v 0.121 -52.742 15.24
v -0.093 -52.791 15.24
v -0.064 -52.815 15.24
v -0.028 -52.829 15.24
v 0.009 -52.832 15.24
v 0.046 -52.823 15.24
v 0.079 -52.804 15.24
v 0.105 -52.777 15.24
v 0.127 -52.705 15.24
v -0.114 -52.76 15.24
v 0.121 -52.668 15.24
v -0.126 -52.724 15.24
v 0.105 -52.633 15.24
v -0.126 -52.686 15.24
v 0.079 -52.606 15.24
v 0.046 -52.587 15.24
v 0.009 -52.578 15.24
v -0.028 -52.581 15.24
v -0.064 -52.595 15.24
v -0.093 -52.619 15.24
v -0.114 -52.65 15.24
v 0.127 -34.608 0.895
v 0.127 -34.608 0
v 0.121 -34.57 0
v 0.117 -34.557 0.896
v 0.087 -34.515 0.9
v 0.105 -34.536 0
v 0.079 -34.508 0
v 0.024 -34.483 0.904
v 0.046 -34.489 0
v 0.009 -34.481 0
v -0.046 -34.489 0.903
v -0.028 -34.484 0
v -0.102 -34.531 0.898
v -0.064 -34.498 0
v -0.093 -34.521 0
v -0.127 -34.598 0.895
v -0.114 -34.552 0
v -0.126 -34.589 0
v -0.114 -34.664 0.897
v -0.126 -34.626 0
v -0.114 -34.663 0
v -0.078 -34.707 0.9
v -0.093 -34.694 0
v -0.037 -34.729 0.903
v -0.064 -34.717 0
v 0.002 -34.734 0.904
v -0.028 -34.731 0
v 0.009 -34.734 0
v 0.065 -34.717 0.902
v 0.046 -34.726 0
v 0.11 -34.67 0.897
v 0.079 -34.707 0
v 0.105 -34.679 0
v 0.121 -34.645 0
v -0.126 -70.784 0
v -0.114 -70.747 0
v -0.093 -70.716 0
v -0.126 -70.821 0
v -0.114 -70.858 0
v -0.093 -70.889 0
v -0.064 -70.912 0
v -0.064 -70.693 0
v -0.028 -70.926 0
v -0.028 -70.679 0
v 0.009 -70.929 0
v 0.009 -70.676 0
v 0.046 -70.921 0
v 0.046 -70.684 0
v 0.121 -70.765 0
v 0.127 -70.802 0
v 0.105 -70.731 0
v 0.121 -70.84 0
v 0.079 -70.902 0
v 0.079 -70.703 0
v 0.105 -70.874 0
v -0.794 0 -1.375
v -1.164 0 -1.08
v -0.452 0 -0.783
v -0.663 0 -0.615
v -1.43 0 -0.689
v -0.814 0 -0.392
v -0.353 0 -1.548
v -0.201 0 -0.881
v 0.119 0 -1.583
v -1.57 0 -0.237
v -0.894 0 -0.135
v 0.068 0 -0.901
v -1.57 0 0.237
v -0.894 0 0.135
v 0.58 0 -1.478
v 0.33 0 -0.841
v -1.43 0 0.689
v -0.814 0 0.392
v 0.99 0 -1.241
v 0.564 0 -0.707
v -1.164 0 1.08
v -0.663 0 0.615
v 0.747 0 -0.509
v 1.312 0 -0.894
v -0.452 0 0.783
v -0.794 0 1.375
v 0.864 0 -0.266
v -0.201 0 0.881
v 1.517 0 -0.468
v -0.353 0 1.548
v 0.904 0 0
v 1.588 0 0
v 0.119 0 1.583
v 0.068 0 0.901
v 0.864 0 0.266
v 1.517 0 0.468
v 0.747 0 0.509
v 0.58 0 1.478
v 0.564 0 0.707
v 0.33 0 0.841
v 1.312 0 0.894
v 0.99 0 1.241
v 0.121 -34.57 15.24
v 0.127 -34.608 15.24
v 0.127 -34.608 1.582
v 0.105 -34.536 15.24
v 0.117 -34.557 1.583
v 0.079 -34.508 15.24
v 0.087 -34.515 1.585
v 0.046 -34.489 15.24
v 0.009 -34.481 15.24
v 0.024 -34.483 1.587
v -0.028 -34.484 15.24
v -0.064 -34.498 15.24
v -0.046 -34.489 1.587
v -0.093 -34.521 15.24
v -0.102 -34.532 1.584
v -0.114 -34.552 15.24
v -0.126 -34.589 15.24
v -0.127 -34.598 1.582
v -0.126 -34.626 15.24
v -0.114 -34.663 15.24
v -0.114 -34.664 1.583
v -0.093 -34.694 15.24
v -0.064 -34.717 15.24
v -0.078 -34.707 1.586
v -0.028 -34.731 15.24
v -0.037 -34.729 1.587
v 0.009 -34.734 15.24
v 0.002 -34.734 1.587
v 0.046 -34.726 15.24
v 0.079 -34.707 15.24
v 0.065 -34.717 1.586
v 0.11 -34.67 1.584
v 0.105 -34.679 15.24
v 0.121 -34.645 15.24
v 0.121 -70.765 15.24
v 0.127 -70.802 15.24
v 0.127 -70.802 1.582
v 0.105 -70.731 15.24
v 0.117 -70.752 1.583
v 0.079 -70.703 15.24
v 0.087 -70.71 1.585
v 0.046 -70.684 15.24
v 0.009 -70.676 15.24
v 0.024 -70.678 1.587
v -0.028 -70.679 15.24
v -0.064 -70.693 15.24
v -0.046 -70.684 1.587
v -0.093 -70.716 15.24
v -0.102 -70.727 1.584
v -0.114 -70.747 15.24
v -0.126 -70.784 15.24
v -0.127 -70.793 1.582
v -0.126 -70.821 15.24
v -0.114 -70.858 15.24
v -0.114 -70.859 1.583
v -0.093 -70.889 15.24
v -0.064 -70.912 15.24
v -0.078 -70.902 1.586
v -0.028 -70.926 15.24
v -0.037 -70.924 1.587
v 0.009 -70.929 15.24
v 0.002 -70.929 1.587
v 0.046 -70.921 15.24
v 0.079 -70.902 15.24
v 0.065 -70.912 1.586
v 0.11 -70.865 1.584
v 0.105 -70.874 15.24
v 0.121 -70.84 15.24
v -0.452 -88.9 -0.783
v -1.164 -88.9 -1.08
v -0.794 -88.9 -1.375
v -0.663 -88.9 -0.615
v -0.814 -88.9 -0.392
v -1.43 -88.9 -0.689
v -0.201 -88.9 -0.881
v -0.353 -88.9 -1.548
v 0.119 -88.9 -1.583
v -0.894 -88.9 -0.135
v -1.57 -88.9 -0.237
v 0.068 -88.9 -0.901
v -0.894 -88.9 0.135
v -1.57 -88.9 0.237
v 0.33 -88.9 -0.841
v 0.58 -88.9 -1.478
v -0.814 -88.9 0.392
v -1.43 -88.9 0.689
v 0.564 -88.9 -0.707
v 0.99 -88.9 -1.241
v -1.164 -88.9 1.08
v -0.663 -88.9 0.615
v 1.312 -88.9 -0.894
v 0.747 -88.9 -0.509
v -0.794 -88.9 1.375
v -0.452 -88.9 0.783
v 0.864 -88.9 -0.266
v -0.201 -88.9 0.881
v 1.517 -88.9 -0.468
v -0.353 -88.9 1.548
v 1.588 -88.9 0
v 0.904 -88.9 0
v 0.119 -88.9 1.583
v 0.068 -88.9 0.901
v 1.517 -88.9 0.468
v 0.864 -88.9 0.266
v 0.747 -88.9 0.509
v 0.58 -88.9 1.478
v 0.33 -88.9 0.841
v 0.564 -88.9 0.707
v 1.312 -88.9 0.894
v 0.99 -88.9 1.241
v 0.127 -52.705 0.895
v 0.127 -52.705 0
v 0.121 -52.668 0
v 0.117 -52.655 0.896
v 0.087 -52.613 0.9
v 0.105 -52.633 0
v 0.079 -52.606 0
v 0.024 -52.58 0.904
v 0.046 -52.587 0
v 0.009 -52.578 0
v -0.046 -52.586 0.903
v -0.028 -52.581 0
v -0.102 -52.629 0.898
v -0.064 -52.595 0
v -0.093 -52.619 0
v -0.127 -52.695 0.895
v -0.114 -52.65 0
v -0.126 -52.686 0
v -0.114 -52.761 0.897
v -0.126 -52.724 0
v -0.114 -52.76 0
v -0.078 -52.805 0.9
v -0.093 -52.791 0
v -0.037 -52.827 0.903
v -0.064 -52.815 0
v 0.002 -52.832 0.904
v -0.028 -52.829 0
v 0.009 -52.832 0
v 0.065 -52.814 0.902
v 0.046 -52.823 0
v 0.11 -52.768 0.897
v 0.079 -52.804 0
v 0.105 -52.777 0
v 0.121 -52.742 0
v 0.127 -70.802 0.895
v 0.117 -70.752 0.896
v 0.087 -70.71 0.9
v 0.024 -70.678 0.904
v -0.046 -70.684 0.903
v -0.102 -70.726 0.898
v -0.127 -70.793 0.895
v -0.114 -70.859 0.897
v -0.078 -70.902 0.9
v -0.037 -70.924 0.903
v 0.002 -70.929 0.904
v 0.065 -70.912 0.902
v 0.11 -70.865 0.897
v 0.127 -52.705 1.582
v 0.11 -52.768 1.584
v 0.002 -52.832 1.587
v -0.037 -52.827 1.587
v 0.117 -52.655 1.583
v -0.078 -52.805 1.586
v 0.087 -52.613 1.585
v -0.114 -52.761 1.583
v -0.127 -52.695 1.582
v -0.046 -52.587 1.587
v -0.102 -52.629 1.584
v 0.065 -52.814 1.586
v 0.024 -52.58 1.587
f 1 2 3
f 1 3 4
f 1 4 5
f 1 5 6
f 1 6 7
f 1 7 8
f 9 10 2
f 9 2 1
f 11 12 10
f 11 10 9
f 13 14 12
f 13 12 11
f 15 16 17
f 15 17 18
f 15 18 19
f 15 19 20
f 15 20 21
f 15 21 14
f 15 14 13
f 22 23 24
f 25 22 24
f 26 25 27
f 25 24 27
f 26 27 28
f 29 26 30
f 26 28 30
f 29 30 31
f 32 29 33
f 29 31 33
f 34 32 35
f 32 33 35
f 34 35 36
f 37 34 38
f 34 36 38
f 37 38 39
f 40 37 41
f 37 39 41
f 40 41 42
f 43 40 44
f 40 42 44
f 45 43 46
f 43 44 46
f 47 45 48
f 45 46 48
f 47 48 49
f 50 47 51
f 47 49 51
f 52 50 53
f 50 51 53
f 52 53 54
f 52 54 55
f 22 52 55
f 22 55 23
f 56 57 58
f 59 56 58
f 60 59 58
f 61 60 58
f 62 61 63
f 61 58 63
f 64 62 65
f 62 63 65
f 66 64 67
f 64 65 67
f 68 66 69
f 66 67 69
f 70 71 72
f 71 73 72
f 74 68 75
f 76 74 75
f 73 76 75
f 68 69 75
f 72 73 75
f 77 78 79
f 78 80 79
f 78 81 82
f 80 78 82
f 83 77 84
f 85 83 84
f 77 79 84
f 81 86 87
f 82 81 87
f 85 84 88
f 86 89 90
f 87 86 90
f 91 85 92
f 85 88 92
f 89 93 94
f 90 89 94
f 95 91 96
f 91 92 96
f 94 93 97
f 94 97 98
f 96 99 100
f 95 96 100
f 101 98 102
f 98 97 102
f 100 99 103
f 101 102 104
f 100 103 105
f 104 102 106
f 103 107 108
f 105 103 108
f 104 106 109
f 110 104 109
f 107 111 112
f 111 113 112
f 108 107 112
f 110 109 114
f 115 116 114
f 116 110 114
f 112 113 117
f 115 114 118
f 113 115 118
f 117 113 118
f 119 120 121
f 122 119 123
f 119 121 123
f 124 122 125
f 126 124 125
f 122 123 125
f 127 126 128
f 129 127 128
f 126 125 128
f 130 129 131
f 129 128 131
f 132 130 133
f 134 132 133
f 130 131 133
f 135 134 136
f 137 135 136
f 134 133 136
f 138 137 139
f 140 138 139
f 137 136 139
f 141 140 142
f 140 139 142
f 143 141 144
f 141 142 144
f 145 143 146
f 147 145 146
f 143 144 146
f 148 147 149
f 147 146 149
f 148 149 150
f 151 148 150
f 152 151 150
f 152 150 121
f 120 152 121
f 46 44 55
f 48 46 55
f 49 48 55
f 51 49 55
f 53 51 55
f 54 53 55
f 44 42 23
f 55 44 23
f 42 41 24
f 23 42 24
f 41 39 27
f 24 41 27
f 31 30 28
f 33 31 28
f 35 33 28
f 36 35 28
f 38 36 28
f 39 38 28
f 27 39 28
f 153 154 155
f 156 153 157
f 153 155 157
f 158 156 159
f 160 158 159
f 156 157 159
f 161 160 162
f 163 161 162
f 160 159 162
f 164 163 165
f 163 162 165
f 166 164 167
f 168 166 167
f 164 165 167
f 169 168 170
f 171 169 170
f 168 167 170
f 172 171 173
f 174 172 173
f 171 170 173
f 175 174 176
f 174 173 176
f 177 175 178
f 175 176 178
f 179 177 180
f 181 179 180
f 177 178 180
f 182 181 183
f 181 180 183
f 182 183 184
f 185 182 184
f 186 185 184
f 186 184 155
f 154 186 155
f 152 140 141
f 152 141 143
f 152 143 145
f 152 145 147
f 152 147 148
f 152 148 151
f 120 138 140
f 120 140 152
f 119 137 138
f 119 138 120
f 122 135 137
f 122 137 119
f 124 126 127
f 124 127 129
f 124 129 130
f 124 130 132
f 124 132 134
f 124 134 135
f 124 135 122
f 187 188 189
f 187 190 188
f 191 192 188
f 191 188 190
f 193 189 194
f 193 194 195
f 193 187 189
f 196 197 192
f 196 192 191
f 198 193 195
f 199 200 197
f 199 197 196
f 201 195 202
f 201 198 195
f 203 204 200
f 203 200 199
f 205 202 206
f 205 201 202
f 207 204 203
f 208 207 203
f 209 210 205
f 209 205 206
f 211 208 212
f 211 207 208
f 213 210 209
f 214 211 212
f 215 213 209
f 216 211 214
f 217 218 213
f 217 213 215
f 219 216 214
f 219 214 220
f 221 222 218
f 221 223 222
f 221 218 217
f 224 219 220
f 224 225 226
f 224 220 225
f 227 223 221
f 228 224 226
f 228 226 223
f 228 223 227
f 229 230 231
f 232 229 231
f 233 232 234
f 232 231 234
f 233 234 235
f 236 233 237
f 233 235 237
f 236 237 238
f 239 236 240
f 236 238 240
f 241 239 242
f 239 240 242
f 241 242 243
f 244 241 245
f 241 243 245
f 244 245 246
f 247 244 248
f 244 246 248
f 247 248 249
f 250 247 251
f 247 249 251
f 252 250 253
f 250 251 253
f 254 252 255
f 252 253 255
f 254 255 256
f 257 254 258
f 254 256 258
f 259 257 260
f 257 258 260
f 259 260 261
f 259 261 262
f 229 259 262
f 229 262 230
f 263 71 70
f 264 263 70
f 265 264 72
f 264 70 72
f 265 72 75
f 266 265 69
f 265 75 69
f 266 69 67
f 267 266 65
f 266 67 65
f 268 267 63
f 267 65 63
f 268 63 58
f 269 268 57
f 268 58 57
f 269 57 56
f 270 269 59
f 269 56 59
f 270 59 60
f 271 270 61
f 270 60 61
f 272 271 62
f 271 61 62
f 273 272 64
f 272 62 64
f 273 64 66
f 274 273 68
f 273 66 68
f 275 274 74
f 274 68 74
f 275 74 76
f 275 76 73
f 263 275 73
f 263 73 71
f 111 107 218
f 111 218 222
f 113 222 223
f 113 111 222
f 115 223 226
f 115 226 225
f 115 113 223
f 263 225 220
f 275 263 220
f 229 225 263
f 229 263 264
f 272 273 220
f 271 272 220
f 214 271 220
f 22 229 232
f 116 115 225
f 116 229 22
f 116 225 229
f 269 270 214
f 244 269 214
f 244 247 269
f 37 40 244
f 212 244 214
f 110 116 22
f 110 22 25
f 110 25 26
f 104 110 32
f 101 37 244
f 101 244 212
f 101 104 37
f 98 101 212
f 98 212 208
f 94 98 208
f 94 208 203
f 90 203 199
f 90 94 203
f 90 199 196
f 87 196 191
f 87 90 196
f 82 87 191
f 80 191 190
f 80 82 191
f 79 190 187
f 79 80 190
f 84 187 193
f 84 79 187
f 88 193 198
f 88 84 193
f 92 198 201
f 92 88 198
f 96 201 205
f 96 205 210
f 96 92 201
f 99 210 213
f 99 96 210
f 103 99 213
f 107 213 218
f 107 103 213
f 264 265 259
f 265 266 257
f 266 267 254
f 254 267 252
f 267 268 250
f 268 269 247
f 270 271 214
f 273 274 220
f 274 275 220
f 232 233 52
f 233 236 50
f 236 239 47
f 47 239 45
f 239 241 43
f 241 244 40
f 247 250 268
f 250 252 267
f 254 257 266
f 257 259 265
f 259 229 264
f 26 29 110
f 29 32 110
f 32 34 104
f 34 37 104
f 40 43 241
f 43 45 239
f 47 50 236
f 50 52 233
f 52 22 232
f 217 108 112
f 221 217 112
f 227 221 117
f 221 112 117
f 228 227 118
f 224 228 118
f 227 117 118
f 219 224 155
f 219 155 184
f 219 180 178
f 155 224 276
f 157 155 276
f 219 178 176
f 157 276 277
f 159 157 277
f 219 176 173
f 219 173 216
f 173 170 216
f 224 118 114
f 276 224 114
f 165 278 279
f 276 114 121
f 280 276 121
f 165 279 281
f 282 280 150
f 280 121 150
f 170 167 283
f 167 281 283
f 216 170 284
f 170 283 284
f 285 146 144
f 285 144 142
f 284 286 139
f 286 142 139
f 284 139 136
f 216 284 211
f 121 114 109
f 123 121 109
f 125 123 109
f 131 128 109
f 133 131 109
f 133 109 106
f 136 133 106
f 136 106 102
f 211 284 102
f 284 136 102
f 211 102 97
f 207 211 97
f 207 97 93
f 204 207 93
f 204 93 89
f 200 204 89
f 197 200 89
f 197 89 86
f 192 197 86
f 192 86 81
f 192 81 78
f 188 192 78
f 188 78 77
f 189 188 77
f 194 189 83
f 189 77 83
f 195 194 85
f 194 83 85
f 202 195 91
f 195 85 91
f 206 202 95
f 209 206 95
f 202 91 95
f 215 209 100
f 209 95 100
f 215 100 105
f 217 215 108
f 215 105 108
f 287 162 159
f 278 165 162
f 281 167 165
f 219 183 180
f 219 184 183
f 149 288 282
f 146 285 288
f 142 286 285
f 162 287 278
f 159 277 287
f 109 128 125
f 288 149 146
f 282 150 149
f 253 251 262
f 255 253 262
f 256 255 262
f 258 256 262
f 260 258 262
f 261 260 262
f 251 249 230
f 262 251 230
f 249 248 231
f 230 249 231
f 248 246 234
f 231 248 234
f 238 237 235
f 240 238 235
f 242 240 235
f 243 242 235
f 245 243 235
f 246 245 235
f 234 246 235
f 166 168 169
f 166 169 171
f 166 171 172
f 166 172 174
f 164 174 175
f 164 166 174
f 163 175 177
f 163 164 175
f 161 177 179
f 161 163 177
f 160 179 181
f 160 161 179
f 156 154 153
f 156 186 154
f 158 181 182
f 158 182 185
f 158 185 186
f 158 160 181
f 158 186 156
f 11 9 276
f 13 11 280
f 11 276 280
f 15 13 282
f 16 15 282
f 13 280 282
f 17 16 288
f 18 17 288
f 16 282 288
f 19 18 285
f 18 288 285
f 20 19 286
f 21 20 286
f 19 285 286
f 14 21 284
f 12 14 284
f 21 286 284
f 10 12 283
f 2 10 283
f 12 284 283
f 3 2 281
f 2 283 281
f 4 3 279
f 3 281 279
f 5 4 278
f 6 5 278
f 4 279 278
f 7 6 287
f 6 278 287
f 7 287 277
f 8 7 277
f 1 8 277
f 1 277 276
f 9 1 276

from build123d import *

# Parameters (mm, degrees)
F0_R     = 1.5875
F0_R_2   = 0.903846
F1_DEPTH = 88.9
F2_R     = 0.127
F3_DEPTH = 15.24


with BuildPart() as f1:
    # F0 (on Front) → F1 (new body)
    with BuildSketch(Plane.XZ):
        Circle(F0_R)
        Circle(F0_R_2, mode=Mode.SUBTRACT)
    extrude(amount=F1_DEPTH)

    # F2 (on Top) → F3 (join)
    with BuildSketch(Plane.XY):
        with Locations((0, -70.8025)):
            Circle(F2_R)
        with Locations((0, -34.6075)):
            Circle(F2_R)
        with Locations((0, -52.705)):
            Circle(F2_R)
    extrude(amount=F3_DEPTH)


solid = f1.part
